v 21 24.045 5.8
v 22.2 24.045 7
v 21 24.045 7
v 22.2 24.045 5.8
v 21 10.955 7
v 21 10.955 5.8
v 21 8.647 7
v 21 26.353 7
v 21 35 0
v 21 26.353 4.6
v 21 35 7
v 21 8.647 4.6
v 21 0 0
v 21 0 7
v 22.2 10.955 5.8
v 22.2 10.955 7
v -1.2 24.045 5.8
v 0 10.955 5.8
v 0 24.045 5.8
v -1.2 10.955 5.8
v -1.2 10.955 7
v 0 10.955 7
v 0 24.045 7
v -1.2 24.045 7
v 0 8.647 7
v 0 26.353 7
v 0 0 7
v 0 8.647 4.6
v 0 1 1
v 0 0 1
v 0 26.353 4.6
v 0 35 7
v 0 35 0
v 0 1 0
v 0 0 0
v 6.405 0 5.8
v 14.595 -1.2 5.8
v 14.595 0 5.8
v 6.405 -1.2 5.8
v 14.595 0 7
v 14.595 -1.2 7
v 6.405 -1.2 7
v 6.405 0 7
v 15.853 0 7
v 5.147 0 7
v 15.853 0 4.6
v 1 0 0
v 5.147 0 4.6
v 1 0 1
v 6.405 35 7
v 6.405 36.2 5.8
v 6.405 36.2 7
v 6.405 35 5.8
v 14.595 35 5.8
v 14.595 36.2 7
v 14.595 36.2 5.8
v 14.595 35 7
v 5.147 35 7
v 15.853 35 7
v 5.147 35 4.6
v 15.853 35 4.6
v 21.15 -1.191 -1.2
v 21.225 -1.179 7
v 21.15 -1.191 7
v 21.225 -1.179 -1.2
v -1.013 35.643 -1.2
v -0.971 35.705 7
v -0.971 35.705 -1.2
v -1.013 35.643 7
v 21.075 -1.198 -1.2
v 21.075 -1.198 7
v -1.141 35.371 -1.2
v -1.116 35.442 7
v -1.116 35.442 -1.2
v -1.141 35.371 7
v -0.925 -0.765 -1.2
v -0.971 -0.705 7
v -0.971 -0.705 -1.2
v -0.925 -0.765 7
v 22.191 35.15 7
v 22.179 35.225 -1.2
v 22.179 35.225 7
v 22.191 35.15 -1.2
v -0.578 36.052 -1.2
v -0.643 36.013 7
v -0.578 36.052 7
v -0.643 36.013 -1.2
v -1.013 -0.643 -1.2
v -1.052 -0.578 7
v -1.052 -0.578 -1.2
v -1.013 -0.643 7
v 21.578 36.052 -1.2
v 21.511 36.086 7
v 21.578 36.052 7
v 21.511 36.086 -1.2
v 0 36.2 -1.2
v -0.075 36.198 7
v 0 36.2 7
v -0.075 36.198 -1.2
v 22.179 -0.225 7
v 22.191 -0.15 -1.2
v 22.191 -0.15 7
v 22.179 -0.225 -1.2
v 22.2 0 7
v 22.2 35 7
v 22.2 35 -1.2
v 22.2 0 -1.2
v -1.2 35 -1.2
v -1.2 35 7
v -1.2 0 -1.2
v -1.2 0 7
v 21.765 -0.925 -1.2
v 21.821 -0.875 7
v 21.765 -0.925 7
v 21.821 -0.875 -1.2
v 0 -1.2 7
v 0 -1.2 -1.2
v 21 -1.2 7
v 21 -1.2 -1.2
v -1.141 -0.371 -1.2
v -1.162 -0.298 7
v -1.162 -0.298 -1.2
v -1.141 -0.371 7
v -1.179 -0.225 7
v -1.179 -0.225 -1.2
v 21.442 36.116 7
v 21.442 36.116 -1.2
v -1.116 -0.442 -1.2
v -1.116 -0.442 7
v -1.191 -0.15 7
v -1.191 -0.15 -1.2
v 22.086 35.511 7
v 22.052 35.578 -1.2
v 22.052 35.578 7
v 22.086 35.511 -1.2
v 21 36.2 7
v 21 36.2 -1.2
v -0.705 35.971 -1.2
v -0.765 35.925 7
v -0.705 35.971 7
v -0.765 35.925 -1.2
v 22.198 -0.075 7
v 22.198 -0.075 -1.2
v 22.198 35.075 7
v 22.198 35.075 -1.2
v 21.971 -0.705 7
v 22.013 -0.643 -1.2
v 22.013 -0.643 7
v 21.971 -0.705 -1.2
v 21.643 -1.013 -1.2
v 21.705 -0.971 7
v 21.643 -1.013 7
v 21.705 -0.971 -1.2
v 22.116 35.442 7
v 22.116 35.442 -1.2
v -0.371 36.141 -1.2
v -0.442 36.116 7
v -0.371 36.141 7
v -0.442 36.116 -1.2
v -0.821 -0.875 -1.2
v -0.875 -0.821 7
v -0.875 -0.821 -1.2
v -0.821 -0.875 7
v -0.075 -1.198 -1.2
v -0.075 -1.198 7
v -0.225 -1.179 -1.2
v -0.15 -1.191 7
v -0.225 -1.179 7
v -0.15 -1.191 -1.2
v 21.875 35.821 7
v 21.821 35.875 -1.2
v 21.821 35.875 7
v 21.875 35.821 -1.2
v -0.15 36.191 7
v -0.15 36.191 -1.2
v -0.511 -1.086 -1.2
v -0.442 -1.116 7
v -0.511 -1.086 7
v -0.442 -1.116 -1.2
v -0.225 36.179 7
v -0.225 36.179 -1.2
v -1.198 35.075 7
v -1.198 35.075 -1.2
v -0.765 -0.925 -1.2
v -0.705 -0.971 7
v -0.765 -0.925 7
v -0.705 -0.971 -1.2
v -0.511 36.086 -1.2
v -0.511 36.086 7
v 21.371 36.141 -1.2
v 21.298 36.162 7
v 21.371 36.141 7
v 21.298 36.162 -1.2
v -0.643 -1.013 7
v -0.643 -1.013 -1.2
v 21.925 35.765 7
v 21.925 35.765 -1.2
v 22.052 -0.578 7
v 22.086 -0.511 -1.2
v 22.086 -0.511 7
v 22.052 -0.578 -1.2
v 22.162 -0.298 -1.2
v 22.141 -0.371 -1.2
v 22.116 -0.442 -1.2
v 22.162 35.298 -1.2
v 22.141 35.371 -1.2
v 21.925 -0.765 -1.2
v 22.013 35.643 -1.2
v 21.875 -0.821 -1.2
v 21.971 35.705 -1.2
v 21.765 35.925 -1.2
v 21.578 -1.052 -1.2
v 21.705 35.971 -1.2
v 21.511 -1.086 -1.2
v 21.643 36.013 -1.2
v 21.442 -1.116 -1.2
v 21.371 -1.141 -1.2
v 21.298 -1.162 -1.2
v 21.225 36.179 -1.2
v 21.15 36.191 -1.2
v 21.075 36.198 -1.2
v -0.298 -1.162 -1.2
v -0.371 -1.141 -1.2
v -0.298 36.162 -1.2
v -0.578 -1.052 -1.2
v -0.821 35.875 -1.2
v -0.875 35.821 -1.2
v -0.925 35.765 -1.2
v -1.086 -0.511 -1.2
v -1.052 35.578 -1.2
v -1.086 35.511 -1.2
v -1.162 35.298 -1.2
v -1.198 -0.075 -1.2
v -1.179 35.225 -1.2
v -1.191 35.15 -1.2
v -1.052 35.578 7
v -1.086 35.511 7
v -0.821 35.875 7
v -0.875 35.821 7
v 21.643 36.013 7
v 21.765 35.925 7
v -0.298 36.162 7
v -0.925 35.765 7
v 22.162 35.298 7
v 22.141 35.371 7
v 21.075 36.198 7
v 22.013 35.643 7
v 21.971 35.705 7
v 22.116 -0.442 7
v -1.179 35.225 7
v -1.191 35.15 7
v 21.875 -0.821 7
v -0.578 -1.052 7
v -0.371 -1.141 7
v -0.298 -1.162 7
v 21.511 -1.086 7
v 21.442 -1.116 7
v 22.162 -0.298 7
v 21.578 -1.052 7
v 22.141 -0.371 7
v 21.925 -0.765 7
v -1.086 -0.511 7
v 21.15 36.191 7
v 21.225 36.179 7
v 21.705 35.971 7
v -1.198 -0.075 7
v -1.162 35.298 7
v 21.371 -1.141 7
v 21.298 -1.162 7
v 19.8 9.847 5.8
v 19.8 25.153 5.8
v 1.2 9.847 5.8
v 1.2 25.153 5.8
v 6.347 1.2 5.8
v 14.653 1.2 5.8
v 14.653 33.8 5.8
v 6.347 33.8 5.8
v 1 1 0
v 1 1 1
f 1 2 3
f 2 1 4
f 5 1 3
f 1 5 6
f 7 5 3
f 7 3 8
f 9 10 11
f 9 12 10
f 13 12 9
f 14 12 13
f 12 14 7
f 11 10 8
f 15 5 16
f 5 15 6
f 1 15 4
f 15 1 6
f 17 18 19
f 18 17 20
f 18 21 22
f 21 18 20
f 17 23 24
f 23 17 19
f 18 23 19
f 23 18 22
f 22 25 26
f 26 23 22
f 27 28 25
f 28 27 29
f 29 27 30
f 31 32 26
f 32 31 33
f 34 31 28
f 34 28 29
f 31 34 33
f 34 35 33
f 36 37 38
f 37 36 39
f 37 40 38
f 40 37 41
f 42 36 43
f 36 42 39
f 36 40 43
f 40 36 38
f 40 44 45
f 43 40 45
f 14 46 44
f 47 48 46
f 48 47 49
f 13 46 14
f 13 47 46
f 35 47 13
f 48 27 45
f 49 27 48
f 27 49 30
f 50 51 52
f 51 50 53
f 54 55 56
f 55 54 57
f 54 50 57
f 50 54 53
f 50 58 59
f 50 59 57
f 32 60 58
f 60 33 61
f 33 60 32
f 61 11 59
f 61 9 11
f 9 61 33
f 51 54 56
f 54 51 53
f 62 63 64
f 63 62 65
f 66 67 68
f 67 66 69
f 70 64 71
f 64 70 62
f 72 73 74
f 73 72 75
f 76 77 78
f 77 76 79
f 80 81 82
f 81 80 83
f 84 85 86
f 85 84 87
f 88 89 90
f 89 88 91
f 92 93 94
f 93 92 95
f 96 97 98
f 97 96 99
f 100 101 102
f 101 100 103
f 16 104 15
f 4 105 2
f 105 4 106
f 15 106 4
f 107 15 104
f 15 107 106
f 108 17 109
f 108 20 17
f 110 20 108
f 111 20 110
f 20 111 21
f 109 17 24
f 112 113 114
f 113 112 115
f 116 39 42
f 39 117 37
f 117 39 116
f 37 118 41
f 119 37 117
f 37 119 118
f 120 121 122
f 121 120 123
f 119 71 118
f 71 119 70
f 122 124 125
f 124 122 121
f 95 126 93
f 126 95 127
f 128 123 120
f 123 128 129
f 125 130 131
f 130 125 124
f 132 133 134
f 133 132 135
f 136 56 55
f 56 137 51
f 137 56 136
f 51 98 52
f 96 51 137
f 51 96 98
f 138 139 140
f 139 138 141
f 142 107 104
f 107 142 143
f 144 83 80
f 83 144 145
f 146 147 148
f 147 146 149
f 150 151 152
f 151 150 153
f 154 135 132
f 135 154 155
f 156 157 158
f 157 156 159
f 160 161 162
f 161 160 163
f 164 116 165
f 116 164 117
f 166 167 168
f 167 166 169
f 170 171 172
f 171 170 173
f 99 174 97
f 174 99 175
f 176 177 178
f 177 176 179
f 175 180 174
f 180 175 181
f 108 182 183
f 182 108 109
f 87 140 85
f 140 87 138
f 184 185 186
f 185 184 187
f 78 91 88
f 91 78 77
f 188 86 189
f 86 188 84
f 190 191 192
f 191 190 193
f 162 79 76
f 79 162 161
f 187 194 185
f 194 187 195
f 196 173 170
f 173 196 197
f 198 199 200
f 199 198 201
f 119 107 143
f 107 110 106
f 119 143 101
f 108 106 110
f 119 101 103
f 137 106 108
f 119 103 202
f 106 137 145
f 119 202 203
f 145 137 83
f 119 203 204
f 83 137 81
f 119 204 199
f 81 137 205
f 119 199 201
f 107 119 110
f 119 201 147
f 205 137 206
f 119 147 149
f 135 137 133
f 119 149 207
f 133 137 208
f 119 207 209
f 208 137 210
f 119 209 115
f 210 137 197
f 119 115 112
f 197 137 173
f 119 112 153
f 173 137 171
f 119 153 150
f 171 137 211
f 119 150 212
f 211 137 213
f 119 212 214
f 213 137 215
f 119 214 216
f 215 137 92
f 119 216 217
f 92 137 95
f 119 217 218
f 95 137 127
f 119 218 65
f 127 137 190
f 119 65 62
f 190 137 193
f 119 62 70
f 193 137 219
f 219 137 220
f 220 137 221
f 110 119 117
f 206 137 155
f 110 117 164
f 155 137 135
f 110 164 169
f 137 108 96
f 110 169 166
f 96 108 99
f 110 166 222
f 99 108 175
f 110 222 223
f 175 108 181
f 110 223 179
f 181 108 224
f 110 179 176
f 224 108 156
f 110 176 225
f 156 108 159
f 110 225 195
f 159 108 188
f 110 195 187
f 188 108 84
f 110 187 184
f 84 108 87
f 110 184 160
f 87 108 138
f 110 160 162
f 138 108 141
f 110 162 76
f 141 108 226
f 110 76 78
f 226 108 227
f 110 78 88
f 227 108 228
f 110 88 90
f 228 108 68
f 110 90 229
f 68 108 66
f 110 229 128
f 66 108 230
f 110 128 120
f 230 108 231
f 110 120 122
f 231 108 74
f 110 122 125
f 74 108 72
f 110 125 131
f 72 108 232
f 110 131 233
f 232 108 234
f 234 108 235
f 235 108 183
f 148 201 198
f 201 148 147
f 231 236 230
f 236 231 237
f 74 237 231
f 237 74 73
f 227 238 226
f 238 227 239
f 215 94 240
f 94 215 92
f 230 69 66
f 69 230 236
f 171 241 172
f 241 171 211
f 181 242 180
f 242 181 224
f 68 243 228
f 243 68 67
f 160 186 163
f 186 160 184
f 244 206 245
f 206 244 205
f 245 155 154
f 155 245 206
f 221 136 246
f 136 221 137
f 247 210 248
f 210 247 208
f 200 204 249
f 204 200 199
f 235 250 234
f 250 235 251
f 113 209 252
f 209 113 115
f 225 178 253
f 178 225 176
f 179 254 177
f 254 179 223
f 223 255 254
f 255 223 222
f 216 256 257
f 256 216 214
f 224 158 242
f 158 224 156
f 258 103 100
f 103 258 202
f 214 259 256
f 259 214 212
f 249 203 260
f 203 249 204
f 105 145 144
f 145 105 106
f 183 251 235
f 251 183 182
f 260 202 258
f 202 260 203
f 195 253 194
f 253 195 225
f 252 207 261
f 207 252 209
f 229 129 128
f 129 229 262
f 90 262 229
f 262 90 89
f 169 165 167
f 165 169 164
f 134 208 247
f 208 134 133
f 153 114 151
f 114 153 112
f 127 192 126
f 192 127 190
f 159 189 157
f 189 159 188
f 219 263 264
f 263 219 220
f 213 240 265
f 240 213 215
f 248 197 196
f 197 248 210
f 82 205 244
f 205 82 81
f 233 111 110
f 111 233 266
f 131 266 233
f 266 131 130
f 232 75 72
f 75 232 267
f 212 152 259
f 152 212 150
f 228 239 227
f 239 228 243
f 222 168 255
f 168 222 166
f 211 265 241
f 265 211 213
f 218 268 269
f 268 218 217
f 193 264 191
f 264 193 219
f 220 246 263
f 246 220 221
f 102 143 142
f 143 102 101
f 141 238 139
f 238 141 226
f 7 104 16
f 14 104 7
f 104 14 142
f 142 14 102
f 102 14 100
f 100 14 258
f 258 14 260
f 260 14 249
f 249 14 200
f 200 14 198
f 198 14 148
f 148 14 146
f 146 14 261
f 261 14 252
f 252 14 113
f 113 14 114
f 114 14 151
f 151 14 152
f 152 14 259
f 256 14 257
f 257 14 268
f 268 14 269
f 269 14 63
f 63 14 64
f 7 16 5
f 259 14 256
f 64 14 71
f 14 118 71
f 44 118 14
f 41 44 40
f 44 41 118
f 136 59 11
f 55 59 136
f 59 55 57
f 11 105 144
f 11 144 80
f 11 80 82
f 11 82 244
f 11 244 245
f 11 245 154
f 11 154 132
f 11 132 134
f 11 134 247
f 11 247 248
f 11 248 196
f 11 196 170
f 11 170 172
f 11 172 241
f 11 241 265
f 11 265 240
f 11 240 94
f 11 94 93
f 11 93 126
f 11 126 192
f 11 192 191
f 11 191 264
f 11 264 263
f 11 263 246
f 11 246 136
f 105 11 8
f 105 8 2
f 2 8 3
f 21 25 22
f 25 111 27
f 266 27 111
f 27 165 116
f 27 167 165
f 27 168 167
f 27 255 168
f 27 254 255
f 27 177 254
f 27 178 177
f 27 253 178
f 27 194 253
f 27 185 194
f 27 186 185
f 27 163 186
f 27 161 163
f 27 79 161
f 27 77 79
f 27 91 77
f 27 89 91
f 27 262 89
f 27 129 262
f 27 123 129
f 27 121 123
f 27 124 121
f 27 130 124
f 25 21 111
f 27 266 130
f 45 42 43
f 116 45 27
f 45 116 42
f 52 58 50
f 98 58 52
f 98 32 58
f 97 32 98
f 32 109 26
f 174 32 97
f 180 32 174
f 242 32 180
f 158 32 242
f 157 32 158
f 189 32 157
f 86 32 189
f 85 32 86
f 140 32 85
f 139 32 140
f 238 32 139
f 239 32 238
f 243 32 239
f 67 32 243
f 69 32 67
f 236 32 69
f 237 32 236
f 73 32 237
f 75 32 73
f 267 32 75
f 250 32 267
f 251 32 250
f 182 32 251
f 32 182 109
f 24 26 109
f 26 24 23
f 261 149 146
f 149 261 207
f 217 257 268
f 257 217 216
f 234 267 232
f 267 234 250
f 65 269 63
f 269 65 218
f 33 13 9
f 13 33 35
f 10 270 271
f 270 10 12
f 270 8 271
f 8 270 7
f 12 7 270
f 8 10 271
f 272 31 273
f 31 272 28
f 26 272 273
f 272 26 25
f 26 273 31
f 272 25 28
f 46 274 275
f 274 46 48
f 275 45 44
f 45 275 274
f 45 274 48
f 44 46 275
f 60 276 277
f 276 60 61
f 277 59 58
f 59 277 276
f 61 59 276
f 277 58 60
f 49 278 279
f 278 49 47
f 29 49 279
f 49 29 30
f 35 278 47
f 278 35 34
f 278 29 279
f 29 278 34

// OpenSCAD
// Based on: https://www.thingiverse.com/thing:5247577

// Which one would you like to see?
part = "box"; // [box:Box only, top: Top cover only, both: Box and top cover]

// Size of your printer's nozzle in mm
nozzle_size = 0.4;

// Number of walls the print should have
number_of_walls = 3; // [1:5]

// Tolerance (use 0.2 for FDM)
tolerance = 0.2; // [0.1:0.1:0.4]

// Interior dimension X in mm
interior_x=21;

// Interior dimension Y in mm
interior_y=35;

// Interior dimension Z in mm (with 2mm zapas)
interior_z=7;

// interior corner radius in mm
radius=0; // [0:20]

// What fraction of the flat X side should the hook take up? (0 for no hook)
x_hook_fraction = 0.5; // [0:0.1:1.0]

// What fraction of the flat Y side should the hook take up? (0 for no hook)
y_hook_fraction = 0.5; // [0:0.1:1.0]

// What fraction of the hooks should have a slot behind them? (0 for no slot)
slot_length = 0.7; // [0:0.1:1]

/* Hidden */
$fn=100;

wall_thickness=nozzle_size*number_of_walls;

// Outer dimensions
x = interior_x + 2 * wall_thickness;
y = interior_y + 2 * wall_thickness;
z = interior_z + 2 * wall_thickness;

hook_thickness = 3 * nozzle_size;

top_cover_wall_thickness = hook_thickness + wall_thickness;

y_hook_length = (y - 2 * radius) * y_hook_fraction;
x_hook_length = (x - 2 * radius) * x_hook_fraction;

module box_interior () {
    offset(r=radius) {
        square([interior_x-2*radius, interior_y-2*radius]);
    }
}

module box_exterior () {
    offset(r=wall_thickness) {
        box_interior();
    }
}

module bottom_box () {
    translate([0,0,-wall_thickness]) {
        difference() {
            // Solid box
            linear_extrude(z - wall_thickness) {
                box_exterior();
            }

            // Hollow out
            translate([0, 0, wall_thickness]) linear_extrude(z) {
                box_interior();
            }
            translate([interior_x / 2, interior_y / 2, 0]) {
                left_slot();
                rotate([180, 180, 0]) left_slot(); // right slot
                front_slot();
                rotate([180, 180, 0]) front_slot(); // back slot
            }
        }
        translate([interior_x / 2, interior_y / 2, 0]) {
            left_hook(); // left hook
            rotate([180, 180, 0]) left_hook(); // right hook
            front_hook(); // front hook
            rotate([180, 180, 0]) front_hook(); // back hook
        }
    }
    cube([1,1,1]);
}

module left_hook () {
    translate([(x-2*wall_thickness)/2,-y_hook_length/2,z-wall_thickness]) rotate([0,90,90]) {
        base_hook(y_hook_length);
    }
}

module front_hook () {
    translate([-x_hook_length/2,-y/2+wall_thickness,z-wall_thickness]) rotate([90,90,90]) {
        base_hook(x_hook_length);
    }
}

module base_hook (hook_length) {
    difference(){
        linear_extrude(hook_length){
            polygon(points=[[0,0],[2*hook_thickness,0],[hook_thickness,hook_thickness]]);
        }
        translate([hook_thickness, hook_thickness, 0]) rotate([45,0,0]) cube(2*hook_thickness, center=true);
        translate([hook_thickness, hook_thickness, hook_length]) rotate([45,0,0]) cube(2*hook_thickness, center=true);
    }
}

module left_slot () {
    slot_length = y_hook_length*slot_length;
    epsilon=2; // ensure it definitely protrudes
    translate([x/2+epsilon,-slot_length/2,z]) rotate([0,90,90]) {
        cube([2*hook_thickness, wall_thickness+epsilon, slot_length]);
    }
}

module front_slot () {
    slot_length = x_hook_length*slot_length;
    epsilon=2; // ensure it definitely protrudes
    translate([-slot_length/2,-y/2-epsilon,z]) rotate([90,90,90]) {
        cube([2*hook_thickness, wall_thickness+epsilon, slot_length]);
    }
}

module right_groove () {
    translate([-tolerance/2+(x-2*wall_thickness)/2,-y_hook_length/2,wall_thickness+hook_thickness*2]) rotate([0,90,90]) linear_extrude(y_hook_length) {
        base_groove();
    }
}


module front_groove () {
    translate([-x_hook_length/2,-y/2+wall_thickness+tolerance/2,wall_thickness+hook_thickness*2]) rotate([90,90,90]) linear_extrude(x_hook_length){
        base_groove();
    }
}

module base_groove () {
    polygon(points=[[0,0],[0, -1], [2*hook_thickness, -1],[2*hook_thickness,0],[hook_thickness,hook_thickness]]);
}

module top_cover () {

    // Top face
    linear_extrude(wall_thickness) {
        box_exterior();
    }

    difference(){
        // Wall of top cover
        inset = wall_thickness + tolerance/2;
        linear_extrude(wall_thickness+hook_thickness*2){
            offset(r=-inset) {
                box_exterior();
            }
        }

        // Hollow out
        translate([0,0,wall_thickness]) linear_extrude(z){
            offset(r=-wall_thickness*2) {
                offset(r=-inset) {
                    box_exterior();
                }
            }
        }

        translate([interior_x / 2, interior_y / 2, 0]) {
            right_groove();
            rotate([180, 180, 0]) right_groove();
            front_groove();
            rotate([180, 180, 0])  front_groove();
        }
    }
}

// left_hook();
print_part();

module print_part() {
	if (part == "box") {
		holes();
	} else if (part == "top") {
		top_cover();
	} else if (part == "both") {
		both();
	} else {
		both();
	}
}

module holes() {
    bottom_box();

}

module both() {
	translate([0,-(y/2+wall_thickness),0]) holes();
    translate([0,+(y/2+wall_thickness),0]) top_cover();
}
